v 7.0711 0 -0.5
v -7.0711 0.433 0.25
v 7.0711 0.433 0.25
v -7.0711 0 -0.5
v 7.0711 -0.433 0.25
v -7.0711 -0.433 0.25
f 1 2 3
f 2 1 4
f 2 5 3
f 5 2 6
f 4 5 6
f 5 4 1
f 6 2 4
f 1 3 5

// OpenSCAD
$fn = 3;
rotate(a = 90, v = [0, 1, 0])
	scale(v = [0.5, 0.5, 10])
		cylinder(h = sqrt(2) * 1, r1 = 1, r2 = 1, center = true);
